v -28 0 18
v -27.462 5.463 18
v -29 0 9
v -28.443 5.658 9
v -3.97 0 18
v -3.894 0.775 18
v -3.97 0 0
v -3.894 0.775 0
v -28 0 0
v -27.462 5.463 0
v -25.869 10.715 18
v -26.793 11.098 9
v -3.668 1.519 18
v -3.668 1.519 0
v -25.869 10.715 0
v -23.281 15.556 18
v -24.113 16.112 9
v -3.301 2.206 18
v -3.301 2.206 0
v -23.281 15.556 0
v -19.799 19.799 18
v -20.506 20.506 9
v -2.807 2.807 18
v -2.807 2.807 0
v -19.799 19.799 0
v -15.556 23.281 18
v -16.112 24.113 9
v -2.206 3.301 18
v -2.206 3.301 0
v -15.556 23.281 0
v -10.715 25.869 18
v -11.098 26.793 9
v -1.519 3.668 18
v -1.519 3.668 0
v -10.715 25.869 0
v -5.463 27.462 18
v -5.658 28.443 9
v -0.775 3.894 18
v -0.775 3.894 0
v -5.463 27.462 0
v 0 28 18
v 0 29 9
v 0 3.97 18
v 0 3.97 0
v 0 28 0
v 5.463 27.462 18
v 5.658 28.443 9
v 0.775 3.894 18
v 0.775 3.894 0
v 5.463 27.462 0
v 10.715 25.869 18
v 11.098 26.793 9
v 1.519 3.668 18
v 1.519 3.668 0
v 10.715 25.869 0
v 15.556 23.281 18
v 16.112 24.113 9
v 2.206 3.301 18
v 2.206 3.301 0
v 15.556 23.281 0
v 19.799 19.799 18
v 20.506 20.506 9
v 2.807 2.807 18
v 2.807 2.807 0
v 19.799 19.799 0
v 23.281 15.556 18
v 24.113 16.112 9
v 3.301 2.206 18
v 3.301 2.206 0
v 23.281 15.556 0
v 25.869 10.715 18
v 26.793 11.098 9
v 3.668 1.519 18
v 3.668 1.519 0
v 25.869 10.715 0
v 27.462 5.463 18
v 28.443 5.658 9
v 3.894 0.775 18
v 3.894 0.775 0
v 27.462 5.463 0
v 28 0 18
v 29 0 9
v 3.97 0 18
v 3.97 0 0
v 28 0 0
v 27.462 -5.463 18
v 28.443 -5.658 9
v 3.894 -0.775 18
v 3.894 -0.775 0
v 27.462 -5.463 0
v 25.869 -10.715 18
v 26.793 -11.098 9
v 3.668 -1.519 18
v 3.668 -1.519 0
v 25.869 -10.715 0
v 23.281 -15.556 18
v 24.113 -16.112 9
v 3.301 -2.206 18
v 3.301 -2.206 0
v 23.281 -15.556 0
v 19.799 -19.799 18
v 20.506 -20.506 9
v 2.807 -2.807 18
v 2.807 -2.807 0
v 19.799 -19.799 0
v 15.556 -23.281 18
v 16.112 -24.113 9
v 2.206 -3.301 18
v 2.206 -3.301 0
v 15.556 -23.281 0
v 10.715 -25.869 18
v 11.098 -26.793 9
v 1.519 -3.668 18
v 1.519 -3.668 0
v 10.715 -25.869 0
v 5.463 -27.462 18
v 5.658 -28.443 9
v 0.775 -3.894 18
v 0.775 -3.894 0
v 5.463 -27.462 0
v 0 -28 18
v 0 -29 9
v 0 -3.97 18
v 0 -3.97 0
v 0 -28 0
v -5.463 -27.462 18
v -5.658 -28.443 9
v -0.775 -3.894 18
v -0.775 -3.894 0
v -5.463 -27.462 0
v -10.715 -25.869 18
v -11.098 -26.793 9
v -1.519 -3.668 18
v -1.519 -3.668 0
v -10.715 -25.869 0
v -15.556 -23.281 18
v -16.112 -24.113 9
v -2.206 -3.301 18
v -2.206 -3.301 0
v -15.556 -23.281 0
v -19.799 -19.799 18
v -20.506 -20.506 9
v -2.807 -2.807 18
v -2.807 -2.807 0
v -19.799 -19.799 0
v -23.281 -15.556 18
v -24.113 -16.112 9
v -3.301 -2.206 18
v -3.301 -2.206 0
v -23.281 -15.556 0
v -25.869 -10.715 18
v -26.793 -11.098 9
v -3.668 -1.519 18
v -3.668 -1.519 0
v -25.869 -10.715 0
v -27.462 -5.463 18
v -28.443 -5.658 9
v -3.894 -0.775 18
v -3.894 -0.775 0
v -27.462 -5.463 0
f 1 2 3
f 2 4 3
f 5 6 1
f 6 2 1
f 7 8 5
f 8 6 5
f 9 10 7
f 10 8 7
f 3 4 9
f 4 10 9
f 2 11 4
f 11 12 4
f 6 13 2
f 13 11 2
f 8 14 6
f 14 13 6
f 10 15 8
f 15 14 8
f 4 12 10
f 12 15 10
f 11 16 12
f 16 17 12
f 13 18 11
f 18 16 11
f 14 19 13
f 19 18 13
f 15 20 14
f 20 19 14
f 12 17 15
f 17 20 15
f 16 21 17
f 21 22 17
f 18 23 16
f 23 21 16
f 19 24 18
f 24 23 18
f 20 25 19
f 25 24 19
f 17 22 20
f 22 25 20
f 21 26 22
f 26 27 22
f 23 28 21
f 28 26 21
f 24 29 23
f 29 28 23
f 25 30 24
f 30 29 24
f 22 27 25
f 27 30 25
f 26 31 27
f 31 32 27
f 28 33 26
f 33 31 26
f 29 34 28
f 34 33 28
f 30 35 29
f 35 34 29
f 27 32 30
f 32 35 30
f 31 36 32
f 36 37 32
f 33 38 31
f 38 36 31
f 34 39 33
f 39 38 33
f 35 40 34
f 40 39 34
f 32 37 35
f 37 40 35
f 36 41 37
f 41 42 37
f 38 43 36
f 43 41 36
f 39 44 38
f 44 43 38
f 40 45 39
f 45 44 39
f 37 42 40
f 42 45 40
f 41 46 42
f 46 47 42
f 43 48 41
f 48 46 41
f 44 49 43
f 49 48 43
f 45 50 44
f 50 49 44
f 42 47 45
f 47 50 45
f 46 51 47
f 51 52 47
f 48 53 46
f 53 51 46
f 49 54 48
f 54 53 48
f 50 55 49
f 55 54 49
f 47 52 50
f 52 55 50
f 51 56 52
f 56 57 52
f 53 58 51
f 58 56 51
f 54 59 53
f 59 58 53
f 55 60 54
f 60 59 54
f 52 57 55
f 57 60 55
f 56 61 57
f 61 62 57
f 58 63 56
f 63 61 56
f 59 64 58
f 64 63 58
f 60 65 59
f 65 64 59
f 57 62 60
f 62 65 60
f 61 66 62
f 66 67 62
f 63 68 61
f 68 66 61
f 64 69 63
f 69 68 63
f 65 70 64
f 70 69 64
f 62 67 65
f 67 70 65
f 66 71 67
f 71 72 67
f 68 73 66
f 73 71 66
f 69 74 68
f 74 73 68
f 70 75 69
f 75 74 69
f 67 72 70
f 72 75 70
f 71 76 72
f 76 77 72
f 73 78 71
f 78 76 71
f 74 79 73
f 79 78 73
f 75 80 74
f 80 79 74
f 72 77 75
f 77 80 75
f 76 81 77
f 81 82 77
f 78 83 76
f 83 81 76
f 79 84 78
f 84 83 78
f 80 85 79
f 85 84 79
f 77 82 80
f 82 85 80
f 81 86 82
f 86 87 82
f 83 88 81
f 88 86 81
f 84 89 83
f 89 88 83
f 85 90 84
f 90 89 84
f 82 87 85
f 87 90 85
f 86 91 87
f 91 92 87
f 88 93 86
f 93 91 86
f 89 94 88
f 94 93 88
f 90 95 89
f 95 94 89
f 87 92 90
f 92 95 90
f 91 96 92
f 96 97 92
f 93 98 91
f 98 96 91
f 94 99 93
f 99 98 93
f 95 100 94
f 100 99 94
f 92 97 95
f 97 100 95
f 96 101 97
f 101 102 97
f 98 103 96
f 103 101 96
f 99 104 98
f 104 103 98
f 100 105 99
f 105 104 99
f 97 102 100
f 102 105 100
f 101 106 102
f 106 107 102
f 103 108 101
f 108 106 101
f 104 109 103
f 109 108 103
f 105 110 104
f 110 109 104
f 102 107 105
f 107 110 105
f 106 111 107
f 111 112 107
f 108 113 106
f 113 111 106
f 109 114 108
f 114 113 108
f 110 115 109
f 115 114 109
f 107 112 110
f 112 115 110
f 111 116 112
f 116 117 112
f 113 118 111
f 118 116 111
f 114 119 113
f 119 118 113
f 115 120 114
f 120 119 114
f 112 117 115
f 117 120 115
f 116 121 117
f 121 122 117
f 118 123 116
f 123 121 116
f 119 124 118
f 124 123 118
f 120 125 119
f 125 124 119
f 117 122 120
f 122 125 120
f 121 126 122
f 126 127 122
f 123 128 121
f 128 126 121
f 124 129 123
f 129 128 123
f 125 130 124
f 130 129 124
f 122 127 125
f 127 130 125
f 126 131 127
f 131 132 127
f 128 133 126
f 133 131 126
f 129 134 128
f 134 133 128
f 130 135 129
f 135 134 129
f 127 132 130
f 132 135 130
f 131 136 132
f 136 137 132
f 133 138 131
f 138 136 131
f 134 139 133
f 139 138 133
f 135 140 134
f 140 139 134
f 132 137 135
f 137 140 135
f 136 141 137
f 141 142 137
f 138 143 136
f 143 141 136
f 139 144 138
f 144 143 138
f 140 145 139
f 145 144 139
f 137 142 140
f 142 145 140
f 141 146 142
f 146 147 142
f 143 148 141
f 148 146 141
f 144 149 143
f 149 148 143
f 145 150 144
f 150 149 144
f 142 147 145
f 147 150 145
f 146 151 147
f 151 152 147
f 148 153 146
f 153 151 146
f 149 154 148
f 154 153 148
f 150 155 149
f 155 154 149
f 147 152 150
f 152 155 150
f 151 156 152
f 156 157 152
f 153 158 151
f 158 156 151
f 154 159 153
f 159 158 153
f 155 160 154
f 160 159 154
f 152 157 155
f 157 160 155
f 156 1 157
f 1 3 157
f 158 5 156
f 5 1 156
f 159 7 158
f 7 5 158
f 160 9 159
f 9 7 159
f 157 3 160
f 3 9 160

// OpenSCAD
$fn = 32;

// ----------------------------------------------------------------------
// Belt roller: 56 mm barrel, 18 mm wide, bore 7.94 mm
// ----------------------------------------------------------------------

// --- parameters (mm) ---
bore_d = 7.94;            // bore
barrel_d = 56;            // barrel diameter
roller_w = 18;            // roller width
crown = 1;                // crown height at mid width

roller_profile = [[3.97, 0], [28, 0], [29, 9], [28, 18], [3.97, 18]];

/* the profile stays clear of the axis, so the bore comes out of the revolve */
rotate_extrude() polygon(roller_profile);
